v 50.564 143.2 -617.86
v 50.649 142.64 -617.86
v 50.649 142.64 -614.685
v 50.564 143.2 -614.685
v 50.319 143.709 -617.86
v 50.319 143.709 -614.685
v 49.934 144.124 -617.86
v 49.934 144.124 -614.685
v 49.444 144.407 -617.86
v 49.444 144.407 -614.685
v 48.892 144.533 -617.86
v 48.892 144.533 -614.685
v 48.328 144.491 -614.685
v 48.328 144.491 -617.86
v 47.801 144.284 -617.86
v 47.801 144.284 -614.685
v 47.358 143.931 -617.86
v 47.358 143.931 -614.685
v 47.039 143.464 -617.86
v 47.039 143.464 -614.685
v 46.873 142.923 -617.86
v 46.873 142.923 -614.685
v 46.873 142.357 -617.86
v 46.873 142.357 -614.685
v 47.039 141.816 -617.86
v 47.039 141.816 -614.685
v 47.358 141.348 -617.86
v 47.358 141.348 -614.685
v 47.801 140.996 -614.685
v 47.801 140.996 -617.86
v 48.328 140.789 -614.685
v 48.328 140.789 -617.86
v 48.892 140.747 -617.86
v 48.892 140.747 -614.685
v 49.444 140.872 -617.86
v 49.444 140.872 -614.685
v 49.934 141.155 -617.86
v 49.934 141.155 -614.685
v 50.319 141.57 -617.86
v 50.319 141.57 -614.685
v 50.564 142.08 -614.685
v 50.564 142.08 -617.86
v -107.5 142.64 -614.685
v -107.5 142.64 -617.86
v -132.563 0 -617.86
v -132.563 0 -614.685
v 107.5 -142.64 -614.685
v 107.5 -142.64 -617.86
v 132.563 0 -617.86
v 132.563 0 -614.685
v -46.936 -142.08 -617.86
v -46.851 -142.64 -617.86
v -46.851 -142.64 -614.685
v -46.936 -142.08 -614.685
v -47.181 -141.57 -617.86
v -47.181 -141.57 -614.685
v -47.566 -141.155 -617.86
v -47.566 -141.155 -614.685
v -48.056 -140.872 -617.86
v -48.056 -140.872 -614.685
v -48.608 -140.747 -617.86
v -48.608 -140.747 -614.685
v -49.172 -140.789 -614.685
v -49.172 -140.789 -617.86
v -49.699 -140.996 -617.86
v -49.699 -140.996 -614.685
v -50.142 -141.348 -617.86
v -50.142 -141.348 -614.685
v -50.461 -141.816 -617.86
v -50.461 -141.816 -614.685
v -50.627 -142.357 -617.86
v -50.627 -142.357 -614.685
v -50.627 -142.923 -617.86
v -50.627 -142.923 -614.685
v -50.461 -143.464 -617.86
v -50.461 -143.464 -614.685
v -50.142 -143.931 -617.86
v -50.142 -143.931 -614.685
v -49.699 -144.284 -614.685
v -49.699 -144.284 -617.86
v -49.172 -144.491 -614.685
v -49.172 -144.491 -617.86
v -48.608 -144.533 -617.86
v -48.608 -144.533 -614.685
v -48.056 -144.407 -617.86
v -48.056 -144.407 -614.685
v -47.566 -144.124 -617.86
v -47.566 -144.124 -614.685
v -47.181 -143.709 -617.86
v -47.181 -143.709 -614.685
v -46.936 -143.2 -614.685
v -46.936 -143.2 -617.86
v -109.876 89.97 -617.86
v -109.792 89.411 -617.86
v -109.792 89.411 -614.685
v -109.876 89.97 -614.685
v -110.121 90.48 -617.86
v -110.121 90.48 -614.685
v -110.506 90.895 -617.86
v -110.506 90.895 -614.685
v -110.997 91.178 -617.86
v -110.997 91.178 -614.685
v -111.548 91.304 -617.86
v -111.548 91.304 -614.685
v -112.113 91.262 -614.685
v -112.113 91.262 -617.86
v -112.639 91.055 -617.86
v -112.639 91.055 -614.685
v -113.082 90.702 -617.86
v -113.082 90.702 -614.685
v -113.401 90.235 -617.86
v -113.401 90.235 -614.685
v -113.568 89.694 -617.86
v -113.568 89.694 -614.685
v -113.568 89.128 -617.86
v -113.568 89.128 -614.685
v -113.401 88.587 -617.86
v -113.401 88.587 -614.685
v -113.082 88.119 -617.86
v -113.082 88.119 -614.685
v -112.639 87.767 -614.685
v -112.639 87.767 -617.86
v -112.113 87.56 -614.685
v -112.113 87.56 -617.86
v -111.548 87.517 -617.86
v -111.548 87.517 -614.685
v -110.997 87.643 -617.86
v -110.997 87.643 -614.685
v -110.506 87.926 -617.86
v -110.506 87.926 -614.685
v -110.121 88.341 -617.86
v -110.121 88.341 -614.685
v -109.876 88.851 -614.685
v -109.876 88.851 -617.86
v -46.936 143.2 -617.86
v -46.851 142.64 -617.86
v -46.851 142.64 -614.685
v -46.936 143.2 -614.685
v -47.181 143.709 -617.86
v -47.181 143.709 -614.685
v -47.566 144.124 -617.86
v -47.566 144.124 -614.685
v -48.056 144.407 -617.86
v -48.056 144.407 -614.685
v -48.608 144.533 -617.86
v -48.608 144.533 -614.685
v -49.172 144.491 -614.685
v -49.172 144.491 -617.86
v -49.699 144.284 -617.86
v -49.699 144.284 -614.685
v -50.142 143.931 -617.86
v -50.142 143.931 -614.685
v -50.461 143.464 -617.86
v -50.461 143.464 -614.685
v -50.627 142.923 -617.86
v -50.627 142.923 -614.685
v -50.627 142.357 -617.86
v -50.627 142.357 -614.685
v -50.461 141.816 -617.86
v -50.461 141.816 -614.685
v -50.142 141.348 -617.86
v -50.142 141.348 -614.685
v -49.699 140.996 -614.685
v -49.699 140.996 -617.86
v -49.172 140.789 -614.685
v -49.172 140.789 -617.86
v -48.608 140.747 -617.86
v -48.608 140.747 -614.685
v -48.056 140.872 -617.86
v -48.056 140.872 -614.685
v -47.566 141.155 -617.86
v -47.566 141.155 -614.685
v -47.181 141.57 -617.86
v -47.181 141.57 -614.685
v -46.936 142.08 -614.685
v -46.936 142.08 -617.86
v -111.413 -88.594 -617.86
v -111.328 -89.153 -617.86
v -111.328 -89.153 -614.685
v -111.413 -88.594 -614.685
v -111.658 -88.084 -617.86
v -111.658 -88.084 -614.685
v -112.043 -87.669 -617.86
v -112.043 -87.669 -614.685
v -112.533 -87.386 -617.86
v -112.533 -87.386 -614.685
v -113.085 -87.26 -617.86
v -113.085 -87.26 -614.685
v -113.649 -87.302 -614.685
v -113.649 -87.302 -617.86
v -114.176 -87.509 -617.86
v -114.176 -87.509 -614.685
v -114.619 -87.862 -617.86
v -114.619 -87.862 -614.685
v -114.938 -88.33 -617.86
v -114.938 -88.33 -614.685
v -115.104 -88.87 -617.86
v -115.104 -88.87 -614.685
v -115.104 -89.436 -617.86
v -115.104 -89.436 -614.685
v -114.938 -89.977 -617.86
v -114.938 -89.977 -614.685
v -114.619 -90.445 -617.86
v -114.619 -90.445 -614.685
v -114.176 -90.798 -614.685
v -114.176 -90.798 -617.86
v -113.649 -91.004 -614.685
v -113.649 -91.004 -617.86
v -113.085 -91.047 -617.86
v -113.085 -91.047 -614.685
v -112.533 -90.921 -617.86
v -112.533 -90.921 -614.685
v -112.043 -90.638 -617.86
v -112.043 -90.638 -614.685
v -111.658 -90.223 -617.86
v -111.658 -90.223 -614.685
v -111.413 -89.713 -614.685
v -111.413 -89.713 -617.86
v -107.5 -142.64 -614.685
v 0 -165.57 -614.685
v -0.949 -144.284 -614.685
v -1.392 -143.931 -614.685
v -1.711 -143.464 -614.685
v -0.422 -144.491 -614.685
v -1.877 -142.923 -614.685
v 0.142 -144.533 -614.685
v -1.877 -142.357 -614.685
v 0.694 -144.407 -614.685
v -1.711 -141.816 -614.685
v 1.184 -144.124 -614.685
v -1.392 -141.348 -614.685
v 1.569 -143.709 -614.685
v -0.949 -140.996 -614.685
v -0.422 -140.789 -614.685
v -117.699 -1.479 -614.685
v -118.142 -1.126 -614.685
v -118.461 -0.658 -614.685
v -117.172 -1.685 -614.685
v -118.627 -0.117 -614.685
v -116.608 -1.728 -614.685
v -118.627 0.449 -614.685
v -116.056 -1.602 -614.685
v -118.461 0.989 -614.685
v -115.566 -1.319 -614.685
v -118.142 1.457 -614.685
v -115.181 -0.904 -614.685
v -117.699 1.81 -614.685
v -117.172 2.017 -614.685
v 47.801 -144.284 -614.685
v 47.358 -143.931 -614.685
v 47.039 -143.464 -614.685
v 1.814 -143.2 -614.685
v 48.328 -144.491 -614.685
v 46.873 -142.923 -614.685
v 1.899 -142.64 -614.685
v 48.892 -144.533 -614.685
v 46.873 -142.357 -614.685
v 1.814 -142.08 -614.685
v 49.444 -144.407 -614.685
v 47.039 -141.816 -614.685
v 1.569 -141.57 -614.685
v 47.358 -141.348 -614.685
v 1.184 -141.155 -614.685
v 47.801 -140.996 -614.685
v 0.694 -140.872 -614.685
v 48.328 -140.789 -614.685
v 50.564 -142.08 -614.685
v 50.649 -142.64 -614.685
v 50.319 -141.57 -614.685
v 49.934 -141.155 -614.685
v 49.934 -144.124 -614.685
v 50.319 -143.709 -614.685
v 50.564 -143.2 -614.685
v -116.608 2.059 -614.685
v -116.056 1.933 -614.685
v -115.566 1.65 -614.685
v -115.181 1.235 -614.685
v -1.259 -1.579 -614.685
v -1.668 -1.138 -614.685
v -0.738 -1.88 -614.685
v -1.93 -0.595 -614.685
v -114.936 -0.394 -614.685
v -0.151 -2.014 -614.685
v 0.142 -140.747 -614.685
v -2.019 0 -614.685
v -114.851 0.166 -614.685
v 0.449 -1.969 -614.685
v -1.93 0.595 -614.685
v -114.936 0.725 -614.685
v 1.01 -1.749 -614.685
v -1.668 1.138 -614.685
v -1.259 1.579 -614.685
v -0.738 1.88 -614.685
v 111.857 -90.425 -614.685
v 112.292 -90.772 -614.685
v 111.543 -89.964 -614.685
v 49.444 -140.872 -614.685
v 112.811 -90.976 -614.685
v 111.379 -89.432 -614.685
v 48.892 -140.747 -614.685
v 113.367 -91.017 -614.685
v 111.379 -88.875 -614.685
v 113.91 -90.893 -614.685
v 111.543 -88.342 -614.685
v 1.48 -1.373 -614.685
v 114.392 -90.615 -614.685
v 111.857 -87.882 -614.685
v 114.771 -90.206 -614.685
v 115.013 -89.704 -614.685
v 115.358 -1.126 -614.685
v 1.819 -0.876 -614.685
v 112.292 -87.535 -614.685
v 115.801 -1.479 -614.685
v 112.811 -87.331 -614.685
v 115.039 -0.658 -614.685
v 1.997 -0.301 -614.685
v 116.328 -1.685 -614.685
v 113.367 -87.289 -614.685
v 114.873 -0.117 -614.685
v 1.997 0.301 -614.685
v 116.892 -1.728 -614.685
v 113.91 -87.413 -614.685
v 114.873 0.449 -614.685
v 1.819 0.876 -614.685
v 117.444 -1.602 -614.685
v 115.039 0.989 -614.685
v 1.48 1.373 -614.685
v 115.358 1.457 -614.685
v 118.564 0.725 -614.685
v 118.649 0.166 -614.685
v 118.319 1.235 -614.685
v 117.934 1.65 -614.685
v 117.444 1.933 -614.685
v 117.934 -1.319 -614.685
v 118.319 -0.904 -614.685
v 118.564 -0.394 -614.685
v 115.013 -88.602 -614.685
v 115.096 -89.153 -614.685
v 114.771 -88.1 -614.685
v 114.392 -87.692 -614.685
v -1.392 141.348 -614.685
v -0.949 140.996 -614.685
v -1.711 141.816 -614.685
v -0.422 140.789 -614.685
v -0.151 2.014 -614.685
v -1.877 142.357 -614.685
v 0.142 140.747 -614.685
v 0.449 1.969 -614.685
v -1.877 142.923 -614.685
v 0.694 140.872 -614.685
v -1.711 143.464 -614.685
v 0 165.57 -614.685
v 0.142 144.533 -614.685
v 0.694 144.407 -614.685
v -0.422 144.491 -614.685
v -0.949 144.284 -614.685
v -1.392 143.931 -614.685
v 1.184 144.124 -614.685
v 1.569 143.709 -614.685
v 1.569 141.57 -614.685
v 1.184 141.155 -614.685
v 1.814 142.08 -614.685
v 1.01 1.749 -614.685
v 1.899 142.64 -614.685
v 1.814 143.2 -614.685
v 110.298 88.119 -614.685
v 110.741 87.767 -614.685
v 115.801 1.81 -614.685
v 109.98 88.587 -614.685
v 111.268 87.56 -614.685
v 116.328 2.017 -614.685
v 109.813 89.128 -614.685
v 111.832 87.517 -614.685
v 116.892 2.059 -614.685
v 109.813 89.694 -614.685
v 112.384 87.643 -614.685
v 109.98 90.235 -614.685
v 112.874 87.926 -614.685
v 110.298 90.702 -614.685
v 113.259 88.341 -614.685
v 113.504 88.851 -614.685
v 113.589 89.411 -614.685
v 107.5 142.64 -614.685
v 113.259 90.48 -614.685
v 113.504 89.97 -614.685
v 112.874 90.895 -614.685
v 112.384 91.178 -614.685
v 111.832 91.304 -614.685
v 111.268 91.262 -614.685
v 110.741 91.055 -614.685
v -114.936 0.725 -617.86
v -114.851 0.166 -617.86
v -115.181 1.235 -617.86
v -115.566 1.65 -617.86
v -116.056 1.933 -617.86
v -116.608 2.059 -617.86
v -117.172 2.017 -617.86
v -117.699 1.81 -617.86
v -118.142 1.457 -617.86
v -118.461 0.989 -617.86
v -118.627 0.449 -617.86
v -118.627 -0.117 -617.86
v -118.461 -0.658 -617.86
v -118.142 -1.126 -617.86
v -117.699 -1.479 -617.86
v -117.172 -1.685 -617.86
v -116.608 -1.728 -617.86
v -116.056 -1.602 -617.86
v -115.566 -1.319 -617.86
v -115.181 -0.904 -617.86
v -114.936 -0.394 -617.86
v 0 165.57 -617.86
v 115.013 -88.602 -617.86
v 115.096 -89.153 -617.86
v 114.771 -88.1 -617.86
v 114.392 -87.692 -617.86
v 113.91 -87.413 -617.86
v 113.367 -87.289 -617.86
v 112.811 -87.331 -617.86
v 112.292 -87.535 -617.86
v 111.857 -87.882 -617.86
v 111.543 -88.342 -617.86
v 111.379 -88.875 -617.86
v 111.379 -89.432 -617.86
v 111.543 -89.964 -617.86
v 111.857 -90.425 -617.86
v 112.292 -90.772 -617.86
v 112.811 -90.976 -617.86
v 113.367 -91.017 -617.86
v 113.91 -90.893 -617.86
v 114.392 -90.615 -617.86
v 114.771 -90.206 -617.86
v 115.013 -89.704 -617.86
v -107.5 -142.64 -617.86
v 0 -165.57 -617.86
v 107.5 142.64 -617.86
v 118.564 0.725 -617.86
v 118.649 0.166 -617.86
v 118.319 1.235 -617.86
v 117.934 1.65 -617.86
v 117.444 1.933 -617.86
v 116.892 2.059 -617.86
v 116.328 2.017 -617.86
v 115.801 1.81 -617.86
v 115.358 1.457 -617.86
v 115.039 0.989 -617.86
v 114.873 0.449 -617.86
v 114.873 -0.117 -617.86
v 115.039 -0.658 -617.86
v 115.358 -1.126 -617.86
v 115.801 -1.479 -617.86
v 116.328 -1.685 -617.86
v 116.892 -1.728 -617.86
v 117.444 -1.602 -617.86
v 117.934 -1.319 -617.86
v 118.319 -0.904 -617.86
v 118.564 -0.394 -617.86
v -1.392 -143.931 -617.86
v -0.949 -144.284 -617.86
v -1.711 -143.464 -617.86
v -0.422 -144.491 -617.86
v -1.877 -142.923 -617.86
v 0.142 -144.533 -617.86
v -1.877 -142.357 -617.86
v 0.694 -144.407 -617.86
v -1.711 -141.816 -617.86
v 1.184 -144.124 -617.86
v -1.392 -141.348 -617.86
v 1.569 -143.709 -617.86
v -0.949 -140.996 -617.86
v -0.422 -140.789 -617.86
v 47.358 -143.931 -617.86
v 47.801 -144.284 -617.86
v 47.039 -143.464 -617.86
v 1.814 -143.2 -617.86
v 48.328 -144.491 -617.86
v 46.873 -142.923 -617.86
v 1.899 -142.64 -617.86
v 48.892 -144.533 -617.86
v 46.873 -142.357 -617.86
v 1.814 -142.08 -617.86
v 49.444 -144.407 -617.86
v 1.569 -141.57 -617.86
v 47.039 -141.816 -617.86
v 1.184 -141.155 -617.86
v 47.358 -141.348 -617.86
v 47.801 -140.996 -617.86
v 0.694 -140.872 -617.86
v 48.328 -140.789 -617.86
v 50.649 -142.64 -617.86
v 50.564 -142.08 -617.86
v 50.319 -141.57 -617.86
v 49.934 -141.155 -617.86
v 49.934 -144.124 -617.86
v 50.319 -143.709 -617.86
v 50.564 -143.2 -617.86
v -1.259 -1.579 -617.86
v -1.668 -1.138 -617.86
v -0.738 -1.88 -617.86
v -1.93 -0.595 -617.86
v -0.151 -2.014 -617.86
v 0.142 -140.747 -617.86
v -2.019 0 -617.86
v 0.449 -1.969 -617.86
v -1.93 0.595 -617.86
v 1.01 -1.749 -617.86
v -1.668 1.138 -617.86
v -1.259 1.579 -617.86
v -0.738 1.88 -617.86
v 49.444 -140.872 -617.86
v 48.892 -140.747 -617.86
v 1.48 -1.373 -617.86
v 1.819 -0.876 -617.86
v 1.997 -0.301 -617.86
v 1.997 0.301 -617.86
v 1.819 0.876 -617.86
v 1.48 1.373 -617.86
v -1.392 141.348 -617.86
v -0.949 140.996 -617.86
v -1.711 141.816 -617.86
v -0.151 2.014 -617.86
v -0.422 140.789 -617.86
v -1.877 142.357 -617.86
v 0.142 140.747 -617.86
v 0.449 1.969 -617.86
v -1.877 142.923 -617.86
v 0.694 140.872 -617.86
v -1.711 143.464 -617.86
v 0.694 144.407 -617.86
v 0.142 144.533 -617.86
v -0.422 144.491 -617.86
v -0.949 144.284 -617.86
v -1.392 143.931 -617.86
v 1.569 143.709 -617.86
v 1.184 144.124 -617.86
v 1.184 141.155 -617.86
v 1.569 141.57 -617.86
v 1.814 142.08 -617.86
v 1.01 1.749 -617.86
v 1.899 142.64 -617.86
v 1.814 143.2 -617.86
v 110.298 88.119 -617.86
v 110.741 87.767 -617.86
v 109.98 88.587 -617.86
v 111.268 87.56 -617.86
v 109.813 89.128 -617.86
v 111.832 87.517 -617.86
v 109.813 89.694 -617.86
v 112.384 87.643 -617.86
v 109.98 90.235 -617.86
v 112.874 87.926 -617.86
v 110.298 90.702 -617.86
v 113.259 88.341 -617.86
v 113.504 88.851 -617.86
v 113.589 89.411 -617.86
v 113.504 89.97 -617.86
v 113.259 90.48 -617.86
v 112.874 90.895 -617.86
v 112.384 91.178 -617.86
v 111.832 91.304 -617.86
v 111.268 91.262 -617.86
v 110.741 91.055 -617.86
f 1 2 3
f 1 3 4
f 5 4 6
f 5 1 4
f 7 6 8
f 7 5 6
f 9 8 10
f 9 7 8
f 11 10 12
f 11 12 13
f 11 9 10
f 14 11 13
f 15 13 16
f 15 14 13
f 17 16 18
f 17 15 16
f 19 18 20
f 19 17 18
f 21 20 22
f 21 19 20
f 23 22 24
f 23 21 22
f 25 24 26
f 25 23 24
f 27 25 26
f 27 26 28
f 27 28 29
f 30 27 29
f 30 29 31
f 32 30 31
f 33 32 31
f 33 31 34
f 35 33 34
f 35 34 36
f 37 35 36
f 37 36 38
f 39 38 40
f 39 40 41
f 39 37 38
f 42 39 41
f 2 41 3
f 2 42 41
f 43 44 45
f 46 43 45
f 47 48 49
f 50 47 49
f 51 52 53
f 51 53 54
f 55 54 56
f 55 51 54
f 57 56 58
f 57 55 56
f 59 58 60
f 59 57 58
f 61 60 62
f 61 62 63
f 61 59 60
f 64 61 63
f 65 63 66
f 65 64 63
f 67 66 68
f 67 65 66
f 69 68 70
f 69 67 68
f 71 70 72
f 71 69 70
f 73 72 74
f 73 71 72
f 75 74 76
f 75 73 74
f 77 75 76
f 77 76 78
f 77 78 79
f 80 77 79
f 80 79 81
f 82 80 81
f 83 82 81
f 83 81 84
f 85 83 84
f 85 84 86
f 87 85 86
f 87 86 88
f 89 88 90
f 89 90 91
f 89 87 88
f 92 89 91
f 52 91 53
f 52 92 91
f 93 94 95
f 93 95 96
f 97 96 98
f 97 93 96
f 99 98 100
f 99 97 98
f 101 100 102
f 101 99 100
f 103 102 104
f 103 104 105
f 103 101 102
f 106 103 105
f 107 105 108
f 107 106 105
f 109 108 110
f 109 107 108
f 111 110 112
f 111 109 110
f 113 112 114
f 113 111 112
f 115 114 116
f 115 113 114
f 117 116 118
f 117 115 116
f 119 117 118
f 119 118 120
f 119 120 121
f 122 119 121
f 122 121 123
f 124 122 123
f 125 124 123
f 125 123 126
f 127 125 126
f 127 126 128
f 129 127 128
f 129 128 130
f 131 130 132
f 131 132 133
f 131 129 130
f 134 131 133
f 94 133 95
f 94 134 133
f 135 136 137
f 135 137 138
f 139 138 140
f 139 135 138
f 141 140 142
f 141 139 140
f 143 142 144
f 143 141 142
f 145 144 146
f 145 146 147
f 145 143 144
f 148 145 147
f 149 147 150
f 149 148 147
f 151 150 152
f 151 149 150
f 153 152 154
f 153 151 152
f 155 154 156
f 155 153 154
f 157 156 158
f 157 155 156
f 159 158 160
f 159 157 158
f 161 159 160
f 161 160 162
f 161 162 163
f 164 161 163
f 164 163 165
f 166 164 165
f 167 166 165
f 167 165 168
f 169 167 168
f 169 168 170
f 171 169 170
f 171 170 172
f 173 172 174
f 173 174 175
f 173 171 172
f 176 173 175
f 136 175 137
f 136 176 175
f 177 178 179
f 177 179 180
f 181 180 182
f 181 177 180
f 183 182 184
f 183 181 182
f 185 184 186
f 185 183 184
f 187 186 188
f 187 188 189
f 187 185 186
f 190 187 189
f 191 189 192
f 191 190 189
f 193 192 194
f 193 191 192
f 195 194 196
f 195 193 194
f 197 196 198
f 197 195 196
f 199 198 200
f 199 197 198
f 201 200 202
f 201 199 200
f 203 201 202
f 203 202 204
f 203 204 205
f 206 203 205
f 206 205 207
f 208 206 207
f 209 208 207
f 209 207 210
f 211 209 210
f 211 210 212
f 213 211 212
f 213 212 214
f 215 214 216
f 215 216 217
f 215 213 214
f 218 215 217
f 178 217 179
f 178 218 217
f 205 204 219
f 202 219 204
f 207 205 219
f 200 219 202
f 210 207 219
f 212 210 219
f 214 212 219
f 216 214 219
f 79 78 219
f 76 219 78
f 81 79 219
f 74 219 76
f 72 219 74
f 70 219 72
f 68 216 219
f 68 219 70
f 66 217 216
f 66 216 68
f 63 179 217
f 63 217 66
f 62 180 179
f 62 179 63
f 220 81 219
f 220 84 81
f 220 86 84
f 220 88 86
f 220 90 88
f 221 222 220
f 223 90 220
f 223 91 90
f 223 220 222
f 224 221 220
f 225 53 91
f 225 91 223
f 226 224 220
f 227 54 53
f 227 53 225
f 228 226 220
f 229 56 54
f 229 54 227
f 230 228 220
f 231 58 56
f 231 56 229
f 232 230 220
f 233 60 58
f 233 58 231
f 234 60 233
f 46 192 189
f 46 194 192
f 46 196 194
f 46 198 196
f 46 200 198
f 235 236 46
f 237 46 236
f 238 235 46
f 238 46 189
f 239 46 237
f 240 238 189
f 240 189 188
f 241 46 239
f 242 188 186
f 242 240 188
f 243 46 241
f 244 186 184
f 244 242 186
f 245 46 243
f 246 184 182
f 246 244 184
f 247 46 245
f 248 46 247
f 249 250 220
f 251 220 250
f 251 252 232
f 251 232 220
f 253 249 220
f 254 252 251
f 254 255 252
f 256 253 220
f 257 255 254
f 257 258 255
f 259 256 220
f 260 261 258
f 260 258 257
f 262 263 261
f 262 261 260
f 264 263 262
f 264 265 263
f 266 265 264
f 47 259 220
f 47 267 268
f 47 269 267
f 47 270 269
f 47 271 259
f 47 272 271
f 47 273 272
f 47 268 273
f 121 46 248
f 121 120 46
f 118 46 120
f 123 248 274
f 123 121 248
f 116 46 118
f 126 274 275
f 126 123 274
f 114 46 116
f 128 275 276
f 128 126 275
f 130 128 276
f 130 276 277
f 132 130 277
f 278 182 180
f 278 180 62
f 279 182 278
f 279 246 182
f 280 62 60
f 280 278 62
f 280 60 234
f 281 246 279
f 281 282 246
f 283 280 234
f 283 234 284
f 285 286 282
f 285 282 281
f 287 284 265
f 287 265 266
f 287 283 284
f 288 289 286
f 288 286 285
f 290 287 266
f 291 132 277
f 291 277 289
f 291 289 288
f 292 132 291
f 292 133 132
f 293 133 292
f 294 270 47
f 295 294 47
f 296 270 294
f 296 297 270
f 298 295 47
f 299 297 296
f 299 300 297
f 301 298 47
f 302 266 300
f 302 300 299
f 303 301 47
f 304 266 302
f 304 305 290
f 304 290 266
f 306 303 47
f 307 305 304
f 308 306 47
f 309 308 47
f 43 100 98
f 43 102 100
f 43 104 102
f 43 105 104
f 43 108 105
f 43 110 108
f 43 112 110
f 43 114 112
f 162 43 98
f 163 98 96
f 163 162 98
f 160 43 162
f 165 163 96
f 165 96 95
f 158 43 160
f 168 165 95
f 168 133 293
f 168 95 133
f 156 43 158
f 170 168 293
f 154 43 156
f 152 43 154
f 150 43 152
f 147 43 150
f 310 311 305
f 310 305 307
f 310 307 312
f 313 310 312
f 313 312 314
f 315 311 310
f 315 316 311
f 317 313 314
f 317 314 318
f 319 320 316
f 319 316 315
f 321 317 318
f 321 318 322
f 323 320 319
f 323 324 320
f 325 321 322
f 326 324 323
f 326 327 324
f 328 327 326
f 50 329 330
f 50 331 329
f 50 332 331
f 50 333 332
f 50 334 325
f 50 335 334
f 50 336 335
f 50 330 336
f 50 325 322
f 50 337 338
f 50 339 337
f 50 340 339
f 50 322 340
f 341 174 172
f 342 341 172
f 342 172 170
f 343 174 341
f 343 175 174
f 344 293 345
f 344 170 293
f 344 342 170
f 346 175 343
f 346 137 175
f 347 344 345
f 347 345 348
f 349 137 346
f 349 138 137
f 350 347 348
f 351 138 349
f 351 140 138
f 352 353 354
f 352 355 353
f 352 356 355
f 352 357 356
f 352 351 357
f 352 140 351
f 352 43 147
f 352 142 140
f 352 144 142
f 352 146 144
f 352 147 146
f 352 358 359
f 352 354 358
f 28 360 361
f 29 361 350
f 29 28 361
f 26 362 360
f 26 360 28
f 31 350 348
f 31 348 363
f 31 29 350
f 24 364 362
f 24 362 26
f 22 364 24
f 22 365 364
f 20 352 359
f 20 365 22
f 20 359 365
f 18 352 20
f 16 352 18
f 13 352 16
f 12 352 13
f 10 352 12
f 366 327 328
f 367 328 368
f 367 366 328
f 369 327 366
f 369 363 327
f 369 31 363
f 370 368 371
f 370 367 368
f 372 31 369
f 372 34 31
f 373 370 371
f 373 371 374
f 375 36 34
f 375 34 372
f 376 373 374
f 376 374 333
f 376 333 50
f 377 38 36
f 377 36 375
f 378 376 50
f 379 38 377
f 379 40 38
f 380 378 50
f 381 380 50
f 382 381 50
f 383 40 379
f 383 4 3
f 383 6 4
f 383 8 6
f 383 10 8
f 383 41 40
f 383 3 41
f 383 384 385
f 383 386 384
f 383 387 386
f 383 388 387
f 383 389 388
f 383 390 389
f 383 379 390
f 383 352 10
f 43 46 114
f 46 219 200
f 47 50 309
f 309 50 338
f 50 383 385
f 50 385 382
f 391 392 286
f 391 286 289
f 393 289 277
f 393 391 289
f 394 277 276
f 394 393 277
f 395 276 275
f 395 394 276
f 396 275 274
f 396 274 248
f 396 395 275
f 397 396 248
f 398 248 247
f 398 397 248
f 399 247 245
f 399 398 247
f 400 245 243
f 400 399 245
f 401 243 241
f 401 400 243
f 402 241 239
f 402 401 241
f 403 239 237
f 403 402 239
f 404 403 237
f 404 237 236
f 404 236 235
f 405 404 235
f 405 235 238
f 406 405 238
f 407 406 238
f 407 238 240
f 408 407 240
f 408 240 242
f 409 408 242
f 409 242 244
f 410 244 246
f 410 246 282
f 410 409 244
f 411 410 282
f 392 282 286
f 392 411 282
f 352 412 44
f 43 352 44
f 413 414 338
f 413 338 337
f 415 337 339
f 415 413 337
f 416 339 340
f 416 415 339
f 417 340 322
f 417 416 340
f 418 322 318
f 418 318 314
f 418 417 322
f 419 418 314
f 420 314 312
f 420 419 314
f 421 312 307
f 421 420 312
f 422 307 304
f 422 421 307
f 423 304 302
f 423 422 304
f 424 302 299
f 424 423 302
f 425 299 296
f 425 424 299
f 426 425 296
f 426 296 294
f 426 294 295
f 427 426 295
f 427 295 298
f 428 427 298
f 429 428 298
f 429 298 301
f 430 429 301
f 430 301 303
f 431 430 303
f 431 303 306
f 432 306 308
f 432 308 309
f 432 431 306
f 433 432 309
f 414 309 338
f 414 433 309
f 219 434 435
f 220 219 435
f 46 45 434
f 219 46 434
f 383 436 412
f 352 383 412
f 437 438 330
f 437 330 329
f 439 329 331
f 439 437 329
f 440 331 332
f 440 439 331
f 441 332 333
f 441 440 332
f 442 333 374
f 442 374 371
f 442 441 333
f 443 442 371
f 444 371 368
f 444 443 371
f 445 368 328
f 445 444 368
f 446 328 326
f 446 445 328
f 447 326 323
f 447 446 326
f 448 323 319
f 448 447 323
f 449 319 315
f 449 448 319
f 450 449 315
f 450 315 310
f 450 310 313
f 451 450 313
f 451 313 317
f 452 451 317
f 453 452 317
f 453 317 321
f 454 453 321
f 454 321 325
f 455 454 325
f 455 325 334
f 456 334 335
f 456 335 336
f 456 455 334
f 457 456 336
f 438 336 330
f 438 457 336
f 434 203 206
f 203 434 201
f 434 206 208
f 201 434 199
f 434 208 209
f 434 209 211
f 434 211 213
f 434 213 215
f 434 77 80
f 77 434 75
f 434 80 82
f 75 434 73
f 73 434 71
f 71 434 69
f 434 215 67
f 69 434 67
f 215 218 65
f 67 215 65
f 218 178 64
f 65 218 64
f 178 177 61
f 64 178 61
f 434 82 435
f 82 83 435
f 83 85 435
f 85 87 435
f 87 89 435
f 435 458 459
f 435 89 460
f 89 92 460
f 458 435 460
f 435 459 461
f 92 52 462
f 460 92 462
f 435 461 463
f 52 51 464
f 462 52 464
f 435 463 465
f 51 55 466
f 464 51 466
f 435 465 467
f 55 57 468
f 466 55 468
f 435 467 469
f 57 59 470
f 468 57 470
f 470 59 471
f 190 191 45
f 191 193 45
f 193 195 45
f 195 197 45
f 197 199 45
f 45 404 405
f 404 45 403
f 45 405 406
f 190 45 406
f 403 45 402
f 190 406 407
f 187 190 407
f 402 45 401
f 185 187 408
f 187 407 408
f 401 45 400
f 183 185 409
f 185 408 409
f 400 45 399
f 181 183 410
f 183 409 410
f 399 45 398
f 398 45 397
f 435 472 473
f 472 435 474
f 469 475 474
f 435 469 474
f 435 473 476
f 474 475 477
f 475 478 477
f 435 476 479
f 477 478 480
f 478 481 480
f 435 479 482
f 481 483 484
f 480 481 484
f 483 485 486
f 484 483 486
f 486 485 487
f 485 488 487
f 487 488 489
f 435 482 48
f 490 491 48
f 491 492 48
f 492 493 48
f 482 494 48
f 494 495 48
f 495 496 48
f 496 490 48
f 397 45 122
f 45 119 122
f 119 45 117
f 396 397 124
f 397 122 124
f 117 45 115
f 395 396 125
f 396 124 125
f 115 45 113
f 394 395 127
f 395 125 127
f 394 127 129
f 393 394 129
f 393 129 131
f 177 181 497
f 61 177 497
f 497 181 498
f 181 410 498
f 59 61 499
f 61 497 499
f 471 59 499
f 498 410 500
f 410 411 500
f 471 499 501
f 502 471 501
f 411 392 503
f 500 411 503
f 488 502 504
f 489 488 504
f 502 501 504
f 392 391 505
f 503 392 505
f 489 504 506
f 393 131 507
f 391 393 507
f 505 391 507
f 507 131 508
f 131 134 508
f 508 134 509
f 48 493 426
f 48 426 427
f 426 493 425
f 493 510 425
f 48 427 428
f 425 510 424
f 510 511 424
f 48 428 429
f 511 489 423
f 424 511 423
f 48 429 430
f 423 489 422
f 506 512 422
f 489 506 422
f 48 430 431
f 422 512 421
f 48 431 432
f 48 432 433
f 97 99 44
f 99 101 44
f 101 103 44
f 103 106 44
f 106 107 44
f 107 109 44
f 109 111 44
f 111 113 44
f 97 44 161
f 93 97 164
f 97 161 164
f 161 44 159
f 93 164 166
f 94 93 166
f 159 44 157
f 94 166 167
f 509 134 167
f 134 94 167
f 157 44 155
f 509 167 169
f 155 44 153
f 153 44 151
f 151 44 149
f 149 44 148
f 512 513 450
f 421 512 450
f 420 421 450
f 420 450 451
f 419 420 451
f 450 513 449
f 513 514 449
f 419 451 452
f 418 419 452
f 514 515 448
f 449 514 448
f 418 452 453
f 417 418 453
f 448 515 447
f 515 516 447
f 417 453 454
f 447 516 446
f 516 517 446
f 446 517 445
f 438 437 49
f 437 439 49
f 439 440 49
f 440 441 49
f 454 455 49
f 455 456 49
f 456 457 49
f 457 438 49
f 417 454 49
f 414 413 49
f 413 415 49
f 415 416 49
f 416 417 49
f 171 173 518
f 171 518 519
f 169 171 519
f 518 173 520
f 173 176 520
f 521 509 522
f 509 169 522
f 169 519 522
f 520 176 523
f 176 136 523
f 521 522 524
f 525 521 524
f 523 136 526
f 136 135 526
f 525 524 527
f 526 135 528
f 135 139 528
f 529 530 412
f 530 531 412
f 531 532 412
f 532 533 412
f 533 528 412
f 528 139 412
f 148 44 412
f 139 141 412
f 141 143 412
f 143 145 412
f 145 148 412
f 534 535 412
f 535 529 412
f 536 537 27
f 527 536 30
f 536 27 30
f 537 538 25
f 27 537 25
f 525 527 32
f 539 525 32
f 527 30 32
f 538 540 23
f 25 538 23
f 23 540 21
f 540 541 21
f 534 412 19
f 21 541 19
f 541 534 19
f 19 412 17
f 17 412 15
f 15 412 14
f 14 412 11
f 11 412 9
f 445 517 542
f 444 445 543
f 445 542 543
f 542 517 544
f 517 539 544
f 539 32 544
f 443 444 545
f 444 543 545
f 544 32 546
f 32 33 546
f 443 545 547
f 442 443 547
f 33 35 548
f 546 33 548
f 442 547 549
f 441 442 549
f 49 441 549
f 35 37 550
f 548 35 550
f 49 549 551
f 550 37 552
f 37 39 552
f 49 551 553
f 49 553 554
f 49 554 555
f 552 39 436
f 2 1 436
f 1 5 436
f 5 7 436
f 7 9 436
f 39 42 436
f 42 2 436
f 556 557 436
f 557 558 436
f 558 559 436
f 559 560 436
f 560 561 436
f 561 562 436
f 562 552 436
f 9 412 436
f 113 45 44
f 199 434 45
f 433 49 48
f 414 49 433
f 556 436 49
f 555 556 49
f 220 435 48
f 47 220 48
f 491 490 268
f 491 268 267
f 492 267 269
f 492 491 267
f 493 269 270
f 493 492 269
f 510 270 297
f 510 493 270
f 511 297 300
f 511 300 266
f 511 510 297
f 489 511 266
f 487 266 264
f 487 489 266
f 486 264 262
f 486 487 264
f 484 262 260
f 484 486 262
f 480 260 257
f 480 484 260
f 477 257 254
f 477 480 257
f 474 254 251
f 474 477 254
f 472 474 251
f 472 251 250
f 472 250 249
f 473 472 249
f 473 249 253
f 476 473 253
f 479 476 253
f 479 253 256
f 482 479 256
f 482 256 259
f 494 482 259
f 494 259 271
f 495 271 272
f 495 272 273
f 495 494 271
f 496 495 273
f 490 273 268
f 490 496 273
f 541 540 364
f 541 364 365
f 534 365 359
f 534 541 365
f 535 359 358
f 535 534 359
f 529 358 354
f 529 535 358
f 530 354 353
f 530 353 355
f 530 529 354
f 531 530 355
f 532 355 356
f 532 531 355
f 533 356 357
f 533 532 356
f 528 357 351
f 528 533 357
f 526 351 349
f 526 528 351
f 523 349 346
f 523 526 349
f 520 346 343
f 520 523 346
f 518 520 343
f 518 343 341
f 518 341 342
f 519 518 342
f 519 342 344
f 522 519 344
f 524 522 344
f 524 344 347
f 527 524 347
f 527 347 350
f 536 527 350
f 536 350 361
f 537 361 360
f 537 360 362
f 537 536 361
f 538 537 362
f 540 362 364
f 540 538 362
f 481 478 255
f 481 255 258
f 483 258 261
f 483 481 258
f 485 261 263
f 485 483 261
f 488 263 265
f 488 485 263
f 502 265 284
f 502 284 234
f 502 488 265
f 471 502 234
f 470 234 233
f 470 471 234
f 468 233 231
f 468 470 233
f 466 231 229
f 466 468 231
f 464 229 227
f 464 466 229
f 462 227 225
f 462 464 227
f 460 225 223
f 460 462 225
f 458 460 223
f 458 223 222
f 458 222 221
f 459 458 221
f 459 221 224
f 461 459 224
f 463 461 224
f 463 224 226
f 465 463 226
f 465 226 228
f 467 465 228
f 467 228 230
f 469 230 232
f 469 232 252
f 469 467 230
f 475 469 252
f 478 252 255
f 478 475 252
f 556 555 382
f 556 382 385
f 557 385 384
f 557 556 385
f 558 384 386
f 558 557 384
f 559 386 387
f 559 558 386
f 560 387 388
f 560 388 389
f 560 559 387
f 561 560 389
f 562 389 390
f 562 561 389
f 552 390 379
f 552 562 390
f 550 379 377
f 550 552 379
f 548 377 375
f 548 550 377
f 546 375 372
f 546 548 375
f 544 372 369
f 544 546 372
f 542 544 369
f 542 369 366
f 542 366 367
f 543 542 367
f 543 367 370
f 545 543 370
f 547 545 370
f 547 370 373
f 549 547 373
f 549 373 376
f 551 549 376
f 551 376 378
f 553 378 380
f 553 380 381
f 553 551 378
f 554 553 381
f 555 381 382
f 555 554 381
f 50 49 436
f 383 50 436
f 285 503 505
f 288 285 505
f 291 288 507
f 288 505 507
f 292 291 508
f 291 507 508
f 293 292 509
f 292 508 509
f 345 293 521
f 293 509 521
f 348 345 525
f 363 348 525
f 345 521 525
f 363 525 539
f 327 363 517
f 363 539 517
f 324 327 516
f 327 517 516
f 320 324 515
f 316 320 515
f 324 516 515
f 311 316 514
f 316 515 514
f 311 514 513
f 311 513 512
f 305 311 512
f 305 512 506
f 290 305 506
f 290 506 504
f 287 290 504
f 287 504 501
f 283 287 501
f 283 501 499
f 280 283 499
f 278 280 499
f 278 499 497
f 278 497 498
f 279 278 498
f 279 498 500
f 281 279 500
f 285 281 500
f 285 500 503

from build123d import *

# Parameters (mm, degrees)
SKETCH1_R              = 1.89865
SKETCH1_R_2            = 1.869185851
MAINBODY_DEPTH         = 3.175
F_10_32_TAPPED_HOLE1_D = 4.0386


with BuildPart() as part:
    # Sketch1 → MainBody (new body)
    with BuildSketch(Plane.XY.offset(-617.860281703)):
        Polygon((-107.5, 142.639876692), (-132.56321938, 0), (-107.5, -142.639876692), (0, -165.569938346), (107.5, -142.639876692), (132.56321938, 0), (107.5, 142.639876692), (0, 165.569938346), align=None)
        with Locations((48.75, -142.639876692)):
            Circle(SKETCH1_R, mode=Mode.SUBTRACT)
        with Locations((0, -142.639876692)):
            Circle(SKETCH1_R, mode=Mode.SUBTRACT)
        with Locations((-48.75, -142.639876692)):
            Circle(SKETCH1_R, mode=Mode.SUBTRACT)
        with Locations((-113.226895498, -89.153367391)):
            Circle(SKETCH1_R, mode=Mode.SUBTRACT)
        with Locations((-116.750007419, 0.165666821)):
            Circle(SKETCH1_R, mode=Mode.SUBTRACT)
        with Locations((-111.690160304, 89.410835528)):
            Circle(SKETCH1_R, mode=Mode.SUBTRACT)
        with Locations((111.690160304, 89.410835528)):
            Circle(SKETCH1_R, mode=Mode.SUBTRACT)
        with Locations((116.750007419, 0.165666821)):
            Circle(SKETCH1_R, mode=Mode.SUBTRACT)
        with Locations((113.226895498, -89.153367391)):
            Circle(SKETCH1_R_2, mode=Mode.SUBTRACT)
        with Locations((48.75, 142.639876692)):
            Circle(SKETCH1_R, mode=Mode.SUBTRACT)
        with Locations((0, 142.639876692)):
            Circle(SKETCH1_R, mode=Mode.SUBTRACT)
        with Locations((-48.75, 142.639876692)):
            Circle(SKETCH1_R, mode=Mode.SUBTRACT)
    extrude(amount=MAINBODY_DEPTH)

    # #10-32 Tapped Hole1 (through all)
    with Locations(Plane.XY.offset(-614.685281703)):
        with Locations((0, 0)):
            Hole(F_10_32_TAPPED_HOLE1_D / 2)


solid = part.part
